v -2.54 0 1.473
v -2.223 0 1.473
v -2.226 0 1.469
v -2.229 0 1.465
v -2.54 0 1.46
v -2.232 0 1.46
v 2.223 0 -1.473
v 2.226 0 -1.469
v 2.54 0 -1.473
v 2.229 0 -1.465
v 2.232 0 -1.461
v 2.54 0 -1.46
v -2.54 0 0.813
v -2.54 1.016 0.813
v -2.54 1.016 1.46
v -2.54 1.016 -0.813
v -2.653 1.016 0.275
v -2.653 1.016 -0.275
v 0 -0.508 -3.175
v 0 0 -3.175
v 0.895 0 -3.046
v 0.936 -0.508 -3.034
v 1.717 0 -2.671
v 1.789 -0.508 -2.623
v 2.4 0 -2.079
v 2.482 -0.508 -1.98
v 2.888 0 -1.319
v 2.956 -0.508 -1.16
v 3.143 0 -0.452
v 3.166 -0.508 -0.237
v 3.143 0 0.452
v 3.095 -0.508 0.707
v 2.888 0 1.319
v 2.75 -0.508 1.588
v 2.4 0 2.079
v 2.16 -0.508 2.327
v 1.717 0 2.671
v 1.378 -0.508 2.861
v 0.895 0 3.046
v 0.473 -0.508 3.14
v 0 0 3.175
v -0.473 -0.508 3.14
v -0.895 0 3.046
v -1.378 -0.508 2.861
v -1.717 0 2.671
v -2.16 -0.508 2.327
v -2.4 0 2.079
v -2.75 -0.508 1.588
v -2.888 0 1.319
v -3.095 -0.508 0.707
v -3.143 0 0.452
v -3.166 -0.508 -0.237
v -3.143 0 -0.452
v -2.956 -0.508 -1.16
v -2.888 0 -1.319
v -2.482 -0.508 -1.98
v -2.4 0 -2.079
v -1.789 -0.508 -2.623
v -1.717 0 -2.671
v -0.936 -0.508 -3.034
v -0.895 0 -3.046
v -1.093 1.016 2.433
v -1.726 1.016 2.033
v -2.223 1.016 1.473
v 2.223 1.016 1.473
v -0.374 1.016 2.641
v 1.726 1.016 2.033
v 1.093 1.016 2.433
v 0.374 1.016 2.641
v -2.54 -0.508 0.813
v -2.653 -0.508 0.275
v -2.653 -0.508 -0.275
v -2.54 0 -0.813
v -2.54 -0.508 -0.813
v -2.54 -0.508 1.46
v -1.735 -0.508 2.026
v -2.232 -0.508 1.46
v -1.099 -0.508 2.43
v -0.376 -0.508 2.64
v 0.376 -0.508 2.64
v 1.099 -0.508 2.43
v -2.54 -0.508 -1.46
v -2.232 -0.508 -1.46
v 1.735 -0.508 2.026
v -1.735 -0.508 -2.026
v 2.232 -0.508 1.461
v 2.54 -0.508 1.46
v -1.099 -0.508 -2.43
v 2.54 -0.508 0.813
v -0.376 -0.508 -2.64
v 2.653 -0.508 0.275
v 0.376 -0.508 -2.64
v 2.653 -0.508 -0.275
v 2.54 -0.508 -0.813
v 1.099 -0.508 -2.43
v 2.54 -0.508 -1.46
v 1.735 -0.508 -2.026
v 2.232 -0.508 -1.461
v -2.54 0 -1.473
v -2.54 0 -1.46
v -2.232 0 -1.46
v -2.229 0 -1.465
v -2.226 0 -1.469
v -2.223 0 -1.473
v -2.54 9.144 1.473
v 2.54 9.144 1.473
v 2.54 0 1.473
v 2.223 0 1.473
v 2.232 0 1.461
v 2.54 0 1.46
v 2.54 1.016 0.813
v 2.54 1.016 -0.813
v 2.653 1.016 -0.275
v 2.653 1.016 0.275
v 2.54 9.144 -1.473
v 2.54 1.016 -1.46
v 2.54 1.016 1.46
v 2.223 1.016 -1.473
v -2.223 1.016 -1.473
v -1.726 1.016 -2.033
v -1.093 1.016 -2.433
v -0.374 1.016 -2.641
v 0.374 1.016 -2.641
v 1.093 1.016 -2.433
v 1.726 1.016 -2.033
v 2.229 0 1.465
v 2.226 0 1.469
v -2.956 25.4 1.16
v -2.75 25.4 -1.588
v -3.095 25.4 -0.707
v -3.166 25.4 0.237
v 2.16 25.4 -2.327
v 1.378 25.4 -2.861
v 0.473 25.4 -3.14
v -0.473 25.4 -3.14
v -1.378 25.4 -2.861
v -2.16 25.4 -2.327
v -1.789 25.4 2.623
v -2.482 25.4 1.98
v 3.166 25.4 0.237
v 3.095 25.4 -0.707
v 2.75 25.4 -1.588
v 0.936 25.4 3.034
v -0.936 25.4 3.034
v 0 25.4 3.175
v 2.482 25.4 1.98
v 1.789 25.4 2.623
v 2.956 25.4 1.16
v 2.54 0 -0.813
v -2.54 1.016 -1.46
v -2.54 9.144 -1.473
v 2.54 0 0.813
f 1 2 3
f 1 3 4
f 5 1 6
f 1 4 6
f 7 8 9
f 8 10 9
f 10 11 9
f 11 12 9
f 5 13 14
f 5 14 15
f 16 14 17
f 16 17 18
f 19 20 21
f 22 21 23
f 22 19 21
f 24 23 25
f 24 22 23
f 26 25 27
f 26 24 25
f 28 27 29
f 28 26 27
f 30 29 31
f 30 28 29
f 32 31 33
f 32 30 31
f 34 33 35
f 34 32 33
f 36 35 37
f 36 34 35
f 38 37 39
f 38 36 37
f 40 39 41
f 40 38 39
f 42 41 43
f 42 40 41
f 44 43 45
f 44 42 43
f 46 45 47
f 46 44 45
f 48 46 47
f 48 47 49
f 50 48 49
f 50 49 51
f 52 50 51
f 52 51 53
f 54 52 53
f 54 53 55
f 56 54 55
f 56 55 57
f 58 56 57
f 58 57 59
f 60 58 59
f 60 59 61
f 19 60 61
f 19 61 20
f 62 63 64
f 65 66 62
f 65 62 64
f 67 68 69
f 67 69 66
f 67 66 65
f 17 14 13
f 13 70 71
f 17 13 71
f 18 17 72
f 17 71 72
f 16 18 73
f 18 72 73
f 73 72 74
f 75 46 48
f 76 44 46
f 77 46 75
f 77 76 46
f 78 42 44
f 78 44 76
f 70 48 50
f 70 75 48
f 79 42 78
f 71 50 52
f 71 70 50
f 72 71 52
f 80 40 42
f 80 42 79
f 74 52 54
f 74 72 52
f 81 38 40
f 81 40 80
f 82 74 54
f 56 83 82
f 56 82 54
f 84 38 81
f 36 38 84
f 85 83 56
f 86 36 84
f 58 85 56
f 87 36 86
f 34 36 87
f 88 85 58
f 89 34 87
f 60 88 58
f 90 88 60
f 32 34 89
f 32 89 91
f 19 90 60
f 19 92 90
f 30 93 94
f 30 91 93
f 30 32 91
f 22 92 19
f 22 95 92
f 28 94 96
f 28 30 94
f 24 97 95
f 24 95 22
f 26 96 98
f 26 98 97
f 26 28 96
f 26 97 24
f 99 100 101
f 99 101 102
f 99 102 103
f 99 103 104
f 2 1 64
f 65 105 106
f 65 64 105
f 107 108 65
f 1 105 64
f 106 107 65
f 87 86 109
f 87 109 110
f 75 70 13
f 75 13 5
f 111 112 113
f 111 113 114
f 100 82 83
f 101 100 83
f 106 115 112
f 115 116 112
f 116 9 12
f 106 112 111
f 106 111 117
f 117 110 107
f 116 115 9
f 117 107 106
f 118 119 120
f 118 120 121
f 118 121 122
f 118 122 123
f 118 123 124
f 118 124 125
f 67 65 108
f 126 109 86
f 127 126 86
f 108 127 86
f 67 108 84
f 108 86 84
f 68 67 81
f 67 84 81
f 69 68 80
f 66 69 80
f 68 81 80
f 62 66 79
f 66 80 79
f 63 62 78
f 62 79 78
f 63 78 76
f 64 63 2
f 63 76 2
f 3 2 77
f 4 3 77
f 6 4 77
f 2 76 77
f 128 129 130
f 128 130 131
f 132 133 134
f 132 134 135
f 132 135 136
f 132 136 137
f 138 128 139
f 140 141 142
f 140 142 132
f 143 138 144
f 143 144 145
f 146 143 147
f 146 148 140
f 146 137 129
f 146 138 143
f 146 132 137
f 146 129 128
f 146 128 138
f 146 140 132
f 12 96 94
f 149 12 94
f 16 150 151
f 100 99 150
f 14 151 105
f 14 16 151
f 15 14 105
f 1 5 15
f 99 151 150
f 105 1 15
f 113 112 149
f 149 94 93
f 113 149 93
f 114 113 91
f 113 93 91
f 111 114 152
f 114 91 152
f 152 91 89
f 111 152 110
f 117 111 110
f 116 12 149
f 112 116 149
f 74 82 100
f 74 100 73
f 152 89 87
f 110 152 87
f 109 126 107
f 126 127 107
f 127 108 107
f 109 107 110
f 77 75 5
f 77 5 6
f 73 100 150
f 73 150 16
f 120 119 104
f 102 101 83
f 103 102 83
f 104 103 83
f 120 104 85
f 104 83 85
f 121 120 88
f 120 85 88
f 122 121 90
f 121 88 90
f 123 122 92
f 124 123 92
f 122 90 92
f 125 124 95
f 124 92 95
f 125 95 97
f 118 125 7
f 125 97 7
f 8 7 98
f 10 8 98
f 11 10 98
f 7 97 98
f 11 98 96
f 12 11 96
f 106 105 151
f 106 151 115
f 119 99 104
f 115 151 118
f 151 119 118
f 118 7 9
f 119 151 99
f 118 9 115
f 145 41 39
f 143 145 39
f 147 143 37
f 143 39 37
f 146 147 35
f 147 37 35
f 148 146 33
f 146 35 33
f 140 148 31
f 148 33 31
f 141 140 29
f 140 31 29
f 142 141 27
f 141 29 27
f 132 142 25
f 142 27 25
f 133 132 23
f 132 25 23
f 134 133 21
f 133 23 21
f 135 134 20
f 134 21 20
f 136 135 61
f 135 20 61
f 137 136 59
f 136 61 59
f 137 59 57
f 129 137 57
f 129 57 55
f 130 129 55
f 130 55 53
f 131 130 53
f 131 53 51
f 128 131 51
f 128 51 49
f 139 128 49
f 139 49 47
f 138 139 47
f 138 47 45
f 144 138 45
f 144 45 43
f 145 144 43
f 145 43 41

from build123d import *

# Parameters (mm, degrees)
SKETCH1_R           = 3.175
BOSS_EXTRUDE1_DEPTH = 25.4
SKETCH2_W           = 5.08
SKETCH2_H           = 2.9464
CUT_EXTRUDE1_DEPTH  = 9.144
BOSS_EXTRUDE2_START = 0.508
SKETCH3_R           = 3.175
BOSS_EXTRUDE2_DEPTH = 0.508
SKETCH4_R           = 2.667
SKETCH4_W           = 5.08
SKETCH4_H           = 2.921
CUT_EXTRUDE2_DEPTH  = 1.524


with BuildPart() as part:
    # Sketch1 → Boss-Extrude1 (new body)
    with BuildSketch(Plane(origin=(0, 0, 0), x_dir=(1, 0, 0), z_dir=(0, 1, 0))):
        Circle(SKETCH1_R)
    extrude(amount=BOSS_EXTRUDE1_DEPTH)

    # Sketch2 → Cut-Extrude1 (cut)
    with BuildSketch(Plane.XZ):
        Rectangle(SKETCH2_W, SKETCH2_H)
    extrude(amount=-CUT_EXTRUDE1_DEPTH, mode=Mode.SUBTRACT)

    # Sketch3 → Boss-Extrude2 (add)
    with BuildSketch(Plane.XZ.offset(BOSS_EXTRUDE2_START)):
        Circle(SKETCH3_R)
    extrude(amount=-BOSS_EXTRUDE2_DEPTH)

    # Sketch4 → Cut-Extrude2 (cut)
    with BuildSketch(Plane.XZ.offset(0.508)):
        Circle(SKETCH4_R)
        Rectangle(SKETCH4_W, SKETCH4_H)
    extrude(amount=-CUT_EXTRUDE2_DEPTH, mode=Mode.SUBTRACT)


solid = part.part
